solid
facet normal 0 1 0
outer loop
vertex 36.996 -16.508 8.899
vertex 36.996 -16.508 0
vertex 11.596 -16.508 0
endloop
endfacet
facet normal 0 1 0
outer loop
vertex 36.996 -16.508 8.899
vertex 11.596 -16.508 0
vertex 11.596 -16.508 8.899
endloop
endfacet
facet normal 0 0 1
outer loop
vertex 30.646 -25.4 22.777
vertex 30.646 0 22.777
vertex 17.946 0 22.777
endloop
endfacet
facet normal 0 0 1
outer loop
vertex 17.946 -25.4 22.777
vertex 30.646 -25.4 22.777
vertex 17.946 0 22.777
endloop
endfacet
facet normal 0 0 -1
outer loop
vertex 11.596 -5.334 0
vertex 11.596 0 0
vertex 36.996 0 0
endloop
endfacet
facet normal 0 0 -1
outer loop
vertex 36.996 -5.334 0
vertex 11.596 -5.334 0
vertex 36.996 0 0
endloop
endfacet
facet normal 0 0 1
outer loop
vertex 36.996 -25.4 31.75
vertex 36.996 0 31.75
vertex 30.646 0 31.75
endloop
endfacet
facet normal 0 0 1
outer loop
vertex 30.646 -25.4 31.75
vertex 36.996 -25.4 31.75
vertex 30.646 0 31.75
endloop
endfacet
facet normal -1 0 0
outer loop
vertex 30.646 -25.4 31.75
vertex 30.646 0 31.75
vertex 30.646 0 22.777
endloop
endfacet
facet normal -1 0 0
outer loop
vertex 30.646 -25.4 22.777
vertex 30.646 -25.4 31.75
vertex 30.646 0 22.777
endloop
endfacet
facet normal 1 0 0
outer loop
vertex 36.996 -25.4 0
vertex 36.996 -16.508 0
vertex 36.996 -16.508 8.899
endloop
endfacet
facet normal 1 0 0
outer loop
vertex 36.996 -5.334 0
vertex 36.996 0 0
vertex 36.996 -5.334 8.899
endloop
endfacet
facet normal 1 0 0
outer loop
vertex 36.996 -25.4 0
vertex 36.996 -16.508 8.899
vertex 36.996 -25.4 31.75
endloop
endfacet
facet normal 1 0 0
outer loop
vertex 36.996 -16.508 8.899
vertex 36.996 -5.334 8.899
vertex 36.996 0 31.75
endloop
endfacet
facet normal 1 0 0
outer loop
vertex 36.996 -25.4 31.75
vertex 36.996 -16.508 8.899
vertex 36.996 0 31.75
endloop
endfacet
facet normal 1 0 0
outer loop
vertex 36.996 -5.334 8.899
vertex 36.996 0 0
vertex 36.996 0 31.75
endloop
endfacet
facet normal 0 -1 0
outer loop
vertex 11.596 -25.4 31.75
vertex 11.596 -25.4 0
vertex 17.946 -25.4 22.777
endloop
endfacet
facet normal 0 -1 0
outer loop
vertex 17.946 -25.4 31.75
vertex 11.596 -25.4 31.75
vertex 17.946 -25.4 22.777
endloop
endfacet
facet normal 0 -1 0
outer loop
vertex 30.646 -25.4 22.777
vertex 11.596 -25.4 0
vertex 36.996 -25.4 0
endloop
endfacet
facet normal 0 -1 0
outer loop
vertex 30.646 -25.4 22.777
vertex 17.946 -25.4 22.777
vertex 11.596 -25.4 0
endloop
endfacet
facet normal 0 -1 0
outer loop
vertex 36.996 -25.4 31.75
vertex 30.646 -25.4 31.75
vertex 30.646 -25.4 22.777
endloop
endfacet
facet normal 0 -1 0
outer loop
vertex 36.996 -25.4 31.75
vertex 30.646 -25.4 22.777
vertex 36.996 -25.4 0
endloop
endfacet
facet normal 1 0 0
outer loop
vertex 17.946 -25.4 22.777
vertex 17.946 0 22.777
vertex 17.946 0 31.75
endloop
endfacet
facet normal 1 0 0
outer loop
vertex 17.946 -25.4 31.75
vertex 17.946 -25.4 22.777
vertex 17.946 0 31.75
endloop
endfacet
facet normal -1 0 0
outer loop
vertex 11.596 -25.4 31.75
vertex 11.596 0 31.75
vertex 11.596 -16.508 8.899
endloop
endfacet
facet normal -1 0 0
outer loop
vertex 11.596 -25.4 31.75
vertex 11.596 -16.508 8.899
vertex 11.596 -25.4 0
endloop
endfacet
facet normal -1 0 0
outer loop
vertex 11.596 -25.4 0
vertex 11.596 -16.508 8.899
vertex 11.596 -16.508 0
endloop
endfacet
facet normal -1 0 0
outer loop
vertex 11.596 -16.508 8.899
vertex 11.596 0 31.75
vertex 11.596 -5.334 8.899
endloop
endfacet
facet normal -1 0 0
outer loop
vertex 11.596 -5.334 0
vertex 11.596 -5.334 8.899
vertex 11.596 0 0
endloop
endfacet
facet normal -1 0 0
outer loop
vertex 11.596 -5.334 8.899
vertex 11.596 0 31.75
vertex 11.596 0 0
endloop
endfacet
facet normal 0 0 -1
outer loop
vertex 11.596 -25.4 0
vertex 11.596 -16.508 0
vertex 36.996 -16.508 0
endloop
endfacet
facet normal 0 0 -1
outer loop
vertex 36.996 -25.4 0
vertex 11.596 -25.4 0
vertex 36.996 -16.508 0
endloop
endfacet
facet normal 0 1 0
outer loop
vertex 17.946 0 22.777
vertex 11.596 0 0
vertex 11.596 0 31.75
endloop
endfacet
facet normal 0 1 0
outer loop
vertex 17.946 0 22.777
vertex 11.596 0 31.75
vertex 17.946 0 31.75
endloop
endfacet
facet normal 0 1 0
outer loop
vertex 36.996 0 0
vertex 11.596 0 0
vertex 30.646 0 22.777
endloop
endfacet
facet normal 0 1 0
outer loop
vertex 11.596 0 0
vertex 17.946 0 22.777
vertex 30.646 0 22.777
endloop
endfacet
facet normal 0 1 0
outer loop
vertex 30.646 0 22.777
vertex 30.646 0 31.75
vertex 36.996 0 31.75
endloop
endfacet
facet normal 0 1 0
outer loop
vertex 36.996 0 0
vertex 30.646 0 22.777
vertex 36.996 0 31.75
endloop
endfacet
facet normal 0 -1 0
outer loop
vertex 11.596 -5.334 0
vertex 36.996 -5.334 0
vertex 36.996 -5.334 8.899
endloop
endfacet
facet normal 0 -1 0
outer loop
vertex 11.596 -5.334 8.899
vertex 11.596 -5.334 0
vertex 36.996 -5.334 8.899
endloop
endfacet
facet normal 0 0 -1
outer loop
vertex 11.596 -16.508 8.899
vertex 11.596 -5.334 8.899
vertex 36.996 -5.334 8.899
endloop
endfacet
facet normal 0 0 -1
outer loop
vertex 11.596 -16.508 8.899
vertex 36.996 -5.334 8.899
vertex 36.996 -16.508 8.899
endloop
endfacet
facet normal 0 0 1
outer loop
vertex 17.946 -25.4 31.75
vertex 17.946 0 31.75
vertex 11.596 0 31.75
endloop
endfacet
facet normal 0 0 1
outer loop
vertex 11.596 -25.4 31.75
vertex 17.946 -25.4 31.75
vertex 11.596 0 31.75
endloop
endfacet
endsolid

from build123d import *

# Parameters (mm, degrees)
F1_DEPTH = 25.4
F2_W     = 10.244804
F2_H     = 5.900593
F3_DEPTH = 12.7
F4_DEPTH = 12.7
F5_W     = 11.174377
F5_H     = 8.899484
F6_DEPTH = 25.4


with BuildPart() as f1:
    # F0 (on Front) → F1 (new body)
    with BuildSketch(Plane.XZ):
        Polygon((11.595629, 31.75), (11.595629, 0), (36.995629, 0), (36.995629, 31.75), (30.645629, 31.75), (30.645629, 22.77716), (17.945629, 22.77716), (17.945629, 31.75), align=None)
    extrude(amount=F1_DEPTH)

    # F2 (on Right) → F3 (cut)
    with BuildSketch(Plane.YZ):
        with Locations((-12.251601, 2.950296)):
            Rectangle(F2_W, F2_H)
    extrude(amount=-F3_DEPTH, mode=Mode.SUBTRACT)

    # F2 (on Right) → F4 (cut)
    with BuildSketch(Plane.YZ):
        with Locations((-12.251601, 2.950296)):
            Rectangle(F2_W, F2_H)
    extrude(amount=-F4_DEPTH, mode=Mode.SUBTRACT)

    # F5 (on face) → F6 (cut)
    with BuildSketch(Plane(origin=(11.595629, 0, 0), x_dir=(0, -1, 0), z_dir=(-1, 0, 0))):
        with Locations((10.92072, 4.449742)):
            Rectangle(F5_W, F5_H)
    extrude(amount=-F6_DEPTH, mode=Mode.SUBTRACT)


solid = f1.part
